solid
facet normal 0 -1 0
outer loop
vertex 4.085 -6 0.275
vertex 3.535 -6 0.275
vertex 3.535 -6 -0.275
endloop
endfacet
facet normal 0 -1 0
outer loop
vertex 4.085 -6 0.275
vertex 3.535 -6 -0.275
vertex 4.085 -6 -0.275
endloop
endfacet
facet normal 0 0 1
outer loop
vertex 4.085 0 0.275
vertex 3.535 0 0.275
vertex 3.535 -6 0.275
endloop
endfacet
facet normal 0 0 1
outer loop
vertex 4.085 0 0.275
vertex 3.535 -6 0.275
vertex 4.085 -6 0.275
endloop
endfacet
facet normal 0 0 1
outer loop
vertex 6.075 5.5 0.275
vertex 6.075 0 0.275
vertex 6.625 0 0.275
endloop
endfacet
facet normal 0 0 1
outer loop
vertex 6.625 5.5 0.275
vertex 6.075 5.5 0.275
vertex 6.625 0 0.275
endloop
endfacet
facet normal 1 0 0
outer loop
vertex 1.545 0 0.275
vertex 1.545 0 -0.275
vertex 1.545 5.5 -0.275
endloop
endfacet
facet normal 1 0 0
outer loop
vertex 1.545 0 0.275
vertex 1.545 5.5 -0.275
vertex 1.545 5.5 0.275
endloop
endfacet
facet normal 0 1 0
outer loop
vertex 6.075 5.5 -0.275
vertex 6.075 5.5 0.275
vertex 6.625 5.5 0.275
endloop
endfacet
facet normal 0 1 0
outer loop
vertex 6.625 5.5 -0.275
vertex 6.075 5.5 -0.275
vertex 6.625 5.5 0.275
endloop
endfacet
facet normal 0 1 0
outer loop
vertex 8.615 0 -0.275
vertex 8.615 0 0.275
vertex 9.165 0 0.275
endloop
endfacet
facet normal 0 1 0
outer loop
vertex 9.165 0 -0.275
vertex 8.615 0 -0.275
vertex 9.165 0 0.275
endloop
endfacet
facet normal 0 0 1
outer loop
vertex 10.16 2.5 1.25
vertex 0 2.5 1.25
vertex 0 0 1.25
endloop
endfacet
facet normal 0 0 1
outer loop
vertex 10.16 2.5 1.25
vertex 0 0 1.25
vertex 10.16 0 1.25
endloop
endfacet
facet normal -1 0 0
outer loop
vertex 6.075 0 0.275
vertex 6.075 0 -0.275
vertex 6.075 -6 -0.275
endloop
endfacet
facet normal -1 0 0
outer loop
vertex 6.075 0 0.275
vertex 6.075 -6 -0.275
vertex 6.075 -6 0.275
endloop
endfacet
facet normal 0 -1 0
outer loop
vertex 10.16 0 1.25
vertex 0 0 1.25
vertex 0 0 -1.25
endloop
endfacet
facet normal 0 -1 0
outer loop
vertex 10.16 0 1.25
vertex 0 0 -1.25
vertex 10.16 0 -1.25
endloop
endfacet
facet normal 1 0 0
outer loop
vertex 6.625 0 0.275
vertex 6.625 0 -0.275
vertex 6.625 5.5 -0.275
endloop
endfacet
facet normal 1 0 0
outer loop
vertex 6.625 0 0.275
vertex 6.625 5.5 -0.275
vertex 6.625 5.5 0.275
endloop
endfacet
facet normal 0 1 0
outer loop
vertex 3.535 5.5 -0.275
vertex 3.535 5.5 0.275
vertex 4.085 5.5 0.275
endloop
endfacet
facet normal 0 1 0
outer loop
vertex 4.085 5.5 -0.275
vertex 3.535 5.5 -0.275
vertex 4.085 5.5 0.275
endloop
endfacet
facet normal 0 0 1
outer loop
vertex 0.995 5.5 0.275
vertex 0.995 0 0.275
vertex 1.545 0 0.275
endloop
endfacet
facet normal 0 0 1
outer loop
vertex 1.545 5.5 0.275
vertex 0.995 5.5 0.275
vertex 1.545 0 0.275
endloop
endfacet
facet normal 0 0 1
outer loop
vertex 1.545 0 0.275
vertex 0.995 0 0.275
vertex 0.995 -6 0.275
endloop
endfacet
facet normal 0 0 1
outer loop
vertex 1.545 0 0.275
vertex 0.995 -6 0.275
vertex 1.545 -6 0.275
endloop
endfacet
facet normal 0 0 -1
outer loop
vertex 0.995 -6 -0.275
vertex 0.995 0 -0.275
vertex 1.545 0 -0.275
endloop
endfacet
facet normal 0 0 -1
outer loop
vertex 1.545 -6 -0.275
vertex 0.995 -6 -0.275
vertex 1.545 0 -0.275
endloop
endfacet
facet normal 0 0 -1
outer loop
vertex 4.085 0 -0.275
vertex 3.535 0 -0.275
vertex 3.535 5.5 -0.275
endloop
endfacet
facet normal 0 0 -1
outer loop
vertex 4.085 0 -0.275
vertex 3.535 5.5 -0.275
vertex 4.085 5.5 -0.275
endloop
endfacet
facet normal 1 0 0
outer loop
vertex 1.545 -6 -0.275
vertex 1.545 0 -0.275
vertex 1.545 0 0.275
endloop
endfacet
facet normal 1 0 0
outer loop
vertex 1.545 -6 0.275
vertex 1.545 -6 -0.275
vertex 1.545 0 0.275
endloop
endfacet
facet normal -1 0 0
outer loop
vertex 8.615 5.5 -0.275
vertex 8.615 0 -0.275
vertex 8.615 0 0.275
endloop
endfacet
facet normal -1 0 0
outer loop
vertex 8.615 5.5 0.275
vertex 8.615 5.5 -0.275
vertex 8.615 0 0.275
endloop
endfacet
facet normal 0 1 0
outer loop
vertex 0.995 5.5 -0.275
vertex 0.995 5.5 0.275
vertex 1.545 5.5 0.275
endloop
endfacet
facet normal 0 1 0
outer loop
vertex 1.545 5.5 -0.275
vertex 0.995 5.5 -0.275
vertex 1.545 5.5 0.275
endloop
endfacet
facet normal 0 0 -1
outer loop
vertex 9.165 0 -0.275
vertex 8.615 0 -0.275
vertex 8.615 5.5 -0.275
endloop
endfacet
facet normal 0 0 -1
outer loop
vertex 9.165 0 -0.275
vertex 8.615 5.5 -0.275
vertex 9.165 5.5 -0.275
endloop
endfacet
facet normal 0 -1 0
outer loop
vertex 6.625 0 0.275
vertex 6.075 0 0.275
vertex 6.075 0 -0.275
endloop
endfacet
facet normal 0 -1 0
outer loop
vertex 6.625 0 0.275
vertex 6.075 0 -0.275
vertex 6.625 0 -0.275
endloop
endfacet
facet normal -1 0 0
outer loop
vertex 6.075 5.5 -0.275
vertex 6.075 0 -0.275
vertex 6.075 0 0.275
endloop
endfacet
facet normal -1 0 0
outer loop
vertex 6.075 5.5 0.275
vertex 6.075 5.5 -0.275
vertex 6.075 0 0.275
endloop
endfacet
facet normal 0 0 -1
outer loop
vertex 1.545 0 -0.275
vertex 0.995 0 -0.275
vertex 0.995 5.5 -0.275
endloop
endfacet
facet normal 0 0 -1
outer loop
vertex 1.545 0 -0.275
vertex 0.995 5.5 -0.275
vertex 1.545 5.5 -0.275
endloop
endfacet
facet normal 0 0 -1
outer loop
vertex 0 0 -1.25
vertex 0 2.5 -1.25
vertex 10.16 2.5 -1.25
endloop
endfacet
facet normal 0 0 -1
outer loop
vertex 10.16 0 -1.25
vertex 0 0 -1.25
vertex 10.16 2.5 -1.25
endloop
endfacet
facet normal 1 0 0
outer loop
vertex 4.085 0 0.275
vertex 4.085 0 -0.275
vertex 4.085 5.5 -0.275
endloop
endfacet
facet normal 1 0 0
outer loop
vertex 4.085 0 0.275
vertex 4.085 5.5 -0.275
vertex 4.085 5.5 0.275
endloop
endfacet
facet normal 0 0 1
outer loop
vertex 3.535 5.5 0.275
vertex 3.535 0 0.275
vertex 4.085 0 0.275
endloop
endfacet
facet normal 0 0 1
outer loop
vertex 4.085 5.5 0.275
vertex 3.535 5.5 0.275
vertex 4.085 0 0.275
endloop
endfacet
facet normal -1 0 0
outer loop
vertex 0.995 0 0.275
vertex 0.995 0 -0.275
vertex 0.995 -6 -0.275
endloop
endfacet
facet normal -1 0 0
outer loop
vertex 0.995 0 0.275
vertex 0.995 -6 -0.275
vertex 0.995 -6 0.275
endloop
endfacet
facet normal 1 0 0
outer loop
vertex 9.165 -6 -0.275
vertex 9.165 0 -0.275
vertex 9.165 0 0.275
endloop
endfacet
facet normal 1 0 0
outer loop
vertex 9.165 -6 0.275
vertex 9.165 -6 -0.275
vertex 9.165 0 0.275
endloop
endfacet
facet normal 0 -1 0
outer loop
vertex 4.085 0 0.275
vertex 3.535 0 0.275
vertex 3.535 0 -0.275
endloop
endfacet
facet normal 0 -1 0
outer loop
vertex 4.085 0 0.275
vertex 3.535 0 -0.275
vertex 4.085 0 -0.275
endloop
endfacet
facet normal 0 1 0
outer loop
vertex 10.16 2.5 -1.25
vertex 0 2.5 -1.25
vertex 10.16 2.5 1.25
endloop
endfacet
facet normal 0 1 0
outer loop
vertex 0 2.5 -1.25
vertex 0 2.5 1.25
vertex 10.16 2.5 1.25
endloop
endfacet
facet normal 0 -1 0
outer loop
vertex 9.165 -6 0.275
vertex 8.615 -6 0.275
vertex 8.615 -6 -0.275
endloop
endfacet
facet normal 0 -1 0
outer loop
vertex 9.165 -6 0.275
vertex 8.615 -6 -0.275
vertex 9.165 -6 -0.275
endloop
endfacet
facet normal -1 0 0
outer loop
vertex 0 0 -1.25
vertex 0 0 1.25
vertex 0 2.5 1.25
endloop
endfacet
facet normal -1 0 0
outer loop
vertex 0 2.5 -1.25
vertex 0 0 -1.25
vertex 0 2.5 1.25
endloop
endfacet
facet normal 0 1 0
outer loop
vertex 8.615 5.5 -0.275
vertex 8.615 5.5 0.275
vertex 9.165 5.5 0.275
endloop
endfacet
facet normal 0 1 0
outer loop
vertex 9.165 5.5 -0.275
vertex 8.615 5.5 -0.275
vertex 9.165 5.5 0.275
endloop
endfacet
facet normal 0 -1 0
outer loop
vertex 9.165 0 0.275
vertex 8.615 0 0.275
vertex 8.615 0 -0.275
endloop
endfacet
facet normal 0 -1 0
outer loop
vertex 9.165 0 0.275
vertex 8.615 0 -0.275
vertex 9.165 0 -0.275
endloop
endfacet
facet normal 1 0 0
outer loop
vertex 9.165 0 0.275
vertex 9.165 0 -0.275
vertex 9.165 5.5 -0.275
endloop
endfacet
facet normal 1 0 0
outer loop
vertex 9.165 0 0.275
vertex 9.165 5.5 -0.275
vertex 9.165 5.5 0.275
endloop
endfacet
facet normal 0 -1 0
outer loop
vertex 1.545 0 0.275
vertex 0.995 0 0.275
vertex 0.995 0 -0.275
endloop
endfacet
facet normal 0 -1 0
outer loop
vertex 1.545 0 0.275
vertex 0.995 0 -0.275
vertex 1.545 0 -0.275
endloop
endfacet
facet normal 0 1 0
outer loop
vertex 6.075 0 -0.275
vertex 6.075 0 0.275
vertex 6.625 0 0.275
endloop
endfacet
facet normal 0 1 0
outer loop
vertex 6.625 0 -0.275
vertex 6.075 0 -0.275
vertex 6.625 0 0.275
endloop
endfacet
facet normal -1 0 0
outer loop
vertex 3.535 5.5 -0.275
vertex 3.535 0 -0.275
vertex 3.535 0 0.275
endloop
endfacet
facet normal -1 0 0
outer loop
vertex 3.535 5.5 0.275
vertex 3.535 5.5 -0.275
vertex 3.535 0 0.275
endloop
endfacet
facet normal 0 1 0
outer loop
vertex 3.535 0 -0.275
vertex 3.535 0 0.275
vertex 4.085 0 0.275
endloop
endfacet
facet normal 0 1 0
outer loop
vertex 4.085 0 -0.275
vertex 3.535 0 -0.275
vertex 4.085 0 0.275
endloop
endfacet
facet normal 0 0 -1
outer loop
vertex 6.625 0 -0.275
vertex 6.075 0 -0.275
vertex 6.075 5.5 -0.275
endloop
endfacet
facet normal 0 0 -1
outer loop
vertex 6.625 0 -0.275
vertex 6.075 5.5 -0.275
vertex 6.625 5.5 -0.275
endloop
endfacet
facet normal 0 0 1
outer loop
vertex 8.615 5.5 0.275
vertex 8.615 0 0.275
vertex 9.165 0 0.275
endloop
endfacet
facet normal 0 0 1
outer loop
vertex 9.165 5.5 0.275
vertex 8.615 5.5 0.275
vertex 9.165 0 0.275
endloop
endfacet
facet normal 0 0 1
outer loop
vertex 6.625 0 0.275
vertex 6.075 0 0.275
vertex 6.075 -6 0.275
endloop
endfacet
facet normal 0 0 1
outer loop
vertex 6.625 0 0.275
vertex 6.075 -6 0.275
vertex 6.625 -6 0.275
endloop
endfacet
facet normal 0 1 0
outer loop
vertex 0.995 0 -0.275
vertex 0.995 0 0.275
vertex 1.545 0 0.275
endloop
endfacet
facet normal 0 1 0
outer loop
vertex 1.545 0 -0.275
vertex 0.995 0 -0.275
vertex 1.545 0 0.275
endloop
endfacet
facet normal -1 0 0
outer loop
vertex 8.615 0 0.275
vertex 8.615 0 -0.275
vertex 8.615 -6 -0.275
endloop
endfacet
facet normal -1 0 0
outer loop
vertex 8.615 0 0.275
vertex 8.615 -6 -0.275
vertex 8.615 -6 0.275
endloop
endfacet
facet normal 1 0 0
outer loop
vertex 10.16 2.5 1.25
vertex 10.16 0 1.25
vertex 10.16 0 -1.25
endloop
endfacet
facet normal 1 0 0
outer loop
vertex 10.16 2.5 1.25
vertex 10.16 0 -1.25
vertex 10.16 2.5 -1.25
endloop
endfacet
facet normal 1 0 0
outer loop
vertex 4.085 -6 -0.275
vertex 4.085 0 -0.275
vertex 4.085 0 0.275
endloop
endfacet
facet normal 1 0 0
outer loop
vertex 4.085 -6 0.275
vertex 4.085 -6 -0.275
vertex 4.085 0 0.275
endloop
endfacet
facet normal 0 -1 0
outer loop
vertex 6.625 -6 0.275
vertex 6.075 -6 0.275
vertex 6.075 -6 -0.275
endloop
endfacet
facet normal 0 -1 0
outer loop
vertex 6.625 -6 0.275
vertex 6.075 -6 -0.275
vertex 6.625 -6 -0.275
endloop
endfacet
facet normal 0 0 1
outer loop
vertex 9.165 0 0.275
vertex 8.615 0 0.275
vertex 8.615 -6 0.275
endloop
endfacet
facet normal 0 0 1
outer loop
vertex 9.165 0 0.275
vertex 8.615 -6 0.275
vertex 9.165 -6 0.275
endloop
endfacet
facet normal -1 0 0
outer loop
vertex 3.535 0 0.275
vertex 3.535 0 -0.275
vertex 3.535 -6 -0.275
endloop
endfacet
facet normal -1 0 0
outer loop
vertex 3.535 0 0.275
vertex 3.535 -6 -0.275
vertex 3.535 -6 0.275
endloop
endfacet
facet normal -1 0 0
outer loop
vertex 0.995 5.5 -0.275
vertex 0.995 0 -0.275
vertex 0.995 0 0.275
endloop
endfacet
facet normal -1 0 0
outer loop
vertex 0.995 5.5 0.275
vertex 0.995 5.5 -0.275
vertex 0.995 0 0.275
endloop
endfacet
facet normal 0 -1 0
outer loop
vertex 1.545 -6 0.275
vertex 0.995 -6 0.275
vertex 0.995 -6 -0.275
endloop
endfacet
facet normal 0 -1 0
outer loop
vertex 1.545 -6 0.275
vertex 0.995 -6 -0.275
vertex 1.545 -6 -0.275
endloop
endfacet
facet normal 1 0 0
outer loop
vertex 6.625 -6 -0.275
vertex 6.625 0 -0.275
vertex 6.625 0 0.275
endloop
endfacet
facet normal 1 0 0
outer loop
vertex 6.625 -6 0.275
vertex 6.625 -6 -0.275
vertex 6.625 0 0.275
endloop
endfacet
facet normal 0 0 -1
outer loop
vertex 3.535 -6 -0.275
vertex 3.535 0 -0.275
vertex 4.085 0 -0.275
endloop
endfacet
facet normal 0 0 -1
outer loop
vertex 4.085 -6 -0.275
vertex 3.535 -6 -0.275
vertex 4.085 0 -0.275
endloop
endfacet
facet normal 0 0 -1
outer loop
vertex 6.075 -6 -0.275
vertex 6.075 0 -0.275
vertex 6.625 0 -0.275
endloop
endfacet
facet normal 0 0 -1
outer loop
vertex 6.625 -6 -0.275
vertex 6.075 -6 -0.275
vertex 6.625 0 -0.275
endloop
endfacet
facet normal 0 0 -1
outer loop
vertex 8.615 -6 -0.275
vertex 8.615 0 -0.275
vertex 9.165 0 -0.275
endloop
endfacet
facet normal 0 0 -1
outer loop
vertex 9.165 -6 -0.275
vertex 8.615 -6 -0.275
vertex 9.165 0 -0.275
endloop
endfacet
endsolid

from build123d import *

# Parameters (mm, degrees)
SKETCH1_W             = 10.16
SKETCH1_H             = 2.5
BOSS_EXTRUDE1_DEPTH   = 1.25
SKETCH2_W             = 0.55
SKETCH2_H             = 0.55
BOSS_EXTRUDE2_DEPTH   = 6
BOSS_EXTRUDE2_2_DEPTH = 6
BOSS_EXTRUDE2_3_DEPTH = 6
BOSS_EXTRUDE2_4_DEPTH = 6
SKETCH2_2_W           = 0.55
SKETCH2_2_H           = 0.55
BOSS_EXTRUDE3_DEPTH   = 5.5
BOSS_EXTRUDE3_2_DEPTH = 5.5
BOSS_EXTRUDE3_3_DEPTH = 5.5
BOSS_EXTRUDE3_4_DEPTH = 5.5


with BuildPart() as part:
    # Sketch1 → Boss-Extrude1 (new body, symmetric)
    with BuildSketch(Plane.XY):
        with Locations((5.08, 1.25)):
            Rectangle(SKETCH1_W, SKETCH1_H)
    extrude(amount=BOSS_EXTRUDE1_DEPTH, both=True)


with BuildPart() as body_2:
    # Sketch2 → Boss-Extrude2 (new body)
    with BuildSketch(Plane.XZ):
        with Locations((3.81, 0)):
            Rectangle(SKETCH2_W, SKETCH2_H)
    extrude(amount=BOSS_EXTRUDE2_DEPTH)


with BuildPart() as body_3:
    # Sketch2 → Boss-Extrude2 2 (new body)
    with BuildSketch(Plane.XZ):
        with Locations((1.27, 0)):
            Rectangle(SKETCH2_W, SKETCH2_H)
    extrude(amount=BOSS_EXTRUDE2_2_DEPTH)


with BuildPart() as body_4:
    # Sketch2 → Boss-Extrude2 3 (new body)
    with BuildSketch(Plane.XZ):
        with Locations((6.35, 0)):
            Rectangle(SKETCH2_W, SKETCH2_H)
    extrude(amount=BOSS_EXTRUDE2_3_DEPTH)


with BuildPart() as body_5:
    # Sketch2 → Boss-Extrude2 4 (new body)
    with BuildSketch(Plane.XZ):
        with Locations((8.89, 0)):
            Rectangle(SKETCH2_W, SKETCH2_H)
    extrude(amount=BOSS_EXTRUDE2_4_DEPTH)


with BuildPart() as body_6:
    # Sketch2_2 → Boss-Extrude3 (new body)
    with BuildSketch(Plane.XZ):
        with Locations((3.81, 0)):
            Rectangle(SKETCH2_2_W, SKETCH2_2_H)
    extrude(amount=-BOSS_EXTRUDE3_DEPTH)


with BuildPart() as body_7:
    # Sketch2_2 → Boss-Extrude3 2 (new body)
    with BuildSketch(Plane.XZ):
        with Locations((1.27, 0)):
            Rectangle(SKETCH2_2_W, SKETCH2_2_H)
    extrude(amount=-BOSS_EXTRUDE3_2_DEPTH)


with BuildPart() as body_8:
    # Sketch2_2 → Boss-Extrude3 3 (new body)
    with BuildSketch(Plane.XZ):
        with Locations((6.35, 0)):
            Rectangle(SKETCH2_2_W, SKETCH2_2_H)
    extrude(amount=-BOSS_EXTRUDE3_3_DEPTH)


with BuildPart() as body_9:
    # Sketch2_2 → Boss-Extrude3 4 (new body)
    with BuildSketch(Plane.XZ):
        with Locations((8.89, 0)):
            Rectangle(SKETCH2_2_W, SKETCH2_2_H)
    extrude(amount=-BOSS_EXTRUDE3_4_DEPTH)


solid = Compound([part.part, body_2.part, body_3.part, body_4.part, body_5.part, body_6.part, body_7.part, body_8.part, body_9.part])
